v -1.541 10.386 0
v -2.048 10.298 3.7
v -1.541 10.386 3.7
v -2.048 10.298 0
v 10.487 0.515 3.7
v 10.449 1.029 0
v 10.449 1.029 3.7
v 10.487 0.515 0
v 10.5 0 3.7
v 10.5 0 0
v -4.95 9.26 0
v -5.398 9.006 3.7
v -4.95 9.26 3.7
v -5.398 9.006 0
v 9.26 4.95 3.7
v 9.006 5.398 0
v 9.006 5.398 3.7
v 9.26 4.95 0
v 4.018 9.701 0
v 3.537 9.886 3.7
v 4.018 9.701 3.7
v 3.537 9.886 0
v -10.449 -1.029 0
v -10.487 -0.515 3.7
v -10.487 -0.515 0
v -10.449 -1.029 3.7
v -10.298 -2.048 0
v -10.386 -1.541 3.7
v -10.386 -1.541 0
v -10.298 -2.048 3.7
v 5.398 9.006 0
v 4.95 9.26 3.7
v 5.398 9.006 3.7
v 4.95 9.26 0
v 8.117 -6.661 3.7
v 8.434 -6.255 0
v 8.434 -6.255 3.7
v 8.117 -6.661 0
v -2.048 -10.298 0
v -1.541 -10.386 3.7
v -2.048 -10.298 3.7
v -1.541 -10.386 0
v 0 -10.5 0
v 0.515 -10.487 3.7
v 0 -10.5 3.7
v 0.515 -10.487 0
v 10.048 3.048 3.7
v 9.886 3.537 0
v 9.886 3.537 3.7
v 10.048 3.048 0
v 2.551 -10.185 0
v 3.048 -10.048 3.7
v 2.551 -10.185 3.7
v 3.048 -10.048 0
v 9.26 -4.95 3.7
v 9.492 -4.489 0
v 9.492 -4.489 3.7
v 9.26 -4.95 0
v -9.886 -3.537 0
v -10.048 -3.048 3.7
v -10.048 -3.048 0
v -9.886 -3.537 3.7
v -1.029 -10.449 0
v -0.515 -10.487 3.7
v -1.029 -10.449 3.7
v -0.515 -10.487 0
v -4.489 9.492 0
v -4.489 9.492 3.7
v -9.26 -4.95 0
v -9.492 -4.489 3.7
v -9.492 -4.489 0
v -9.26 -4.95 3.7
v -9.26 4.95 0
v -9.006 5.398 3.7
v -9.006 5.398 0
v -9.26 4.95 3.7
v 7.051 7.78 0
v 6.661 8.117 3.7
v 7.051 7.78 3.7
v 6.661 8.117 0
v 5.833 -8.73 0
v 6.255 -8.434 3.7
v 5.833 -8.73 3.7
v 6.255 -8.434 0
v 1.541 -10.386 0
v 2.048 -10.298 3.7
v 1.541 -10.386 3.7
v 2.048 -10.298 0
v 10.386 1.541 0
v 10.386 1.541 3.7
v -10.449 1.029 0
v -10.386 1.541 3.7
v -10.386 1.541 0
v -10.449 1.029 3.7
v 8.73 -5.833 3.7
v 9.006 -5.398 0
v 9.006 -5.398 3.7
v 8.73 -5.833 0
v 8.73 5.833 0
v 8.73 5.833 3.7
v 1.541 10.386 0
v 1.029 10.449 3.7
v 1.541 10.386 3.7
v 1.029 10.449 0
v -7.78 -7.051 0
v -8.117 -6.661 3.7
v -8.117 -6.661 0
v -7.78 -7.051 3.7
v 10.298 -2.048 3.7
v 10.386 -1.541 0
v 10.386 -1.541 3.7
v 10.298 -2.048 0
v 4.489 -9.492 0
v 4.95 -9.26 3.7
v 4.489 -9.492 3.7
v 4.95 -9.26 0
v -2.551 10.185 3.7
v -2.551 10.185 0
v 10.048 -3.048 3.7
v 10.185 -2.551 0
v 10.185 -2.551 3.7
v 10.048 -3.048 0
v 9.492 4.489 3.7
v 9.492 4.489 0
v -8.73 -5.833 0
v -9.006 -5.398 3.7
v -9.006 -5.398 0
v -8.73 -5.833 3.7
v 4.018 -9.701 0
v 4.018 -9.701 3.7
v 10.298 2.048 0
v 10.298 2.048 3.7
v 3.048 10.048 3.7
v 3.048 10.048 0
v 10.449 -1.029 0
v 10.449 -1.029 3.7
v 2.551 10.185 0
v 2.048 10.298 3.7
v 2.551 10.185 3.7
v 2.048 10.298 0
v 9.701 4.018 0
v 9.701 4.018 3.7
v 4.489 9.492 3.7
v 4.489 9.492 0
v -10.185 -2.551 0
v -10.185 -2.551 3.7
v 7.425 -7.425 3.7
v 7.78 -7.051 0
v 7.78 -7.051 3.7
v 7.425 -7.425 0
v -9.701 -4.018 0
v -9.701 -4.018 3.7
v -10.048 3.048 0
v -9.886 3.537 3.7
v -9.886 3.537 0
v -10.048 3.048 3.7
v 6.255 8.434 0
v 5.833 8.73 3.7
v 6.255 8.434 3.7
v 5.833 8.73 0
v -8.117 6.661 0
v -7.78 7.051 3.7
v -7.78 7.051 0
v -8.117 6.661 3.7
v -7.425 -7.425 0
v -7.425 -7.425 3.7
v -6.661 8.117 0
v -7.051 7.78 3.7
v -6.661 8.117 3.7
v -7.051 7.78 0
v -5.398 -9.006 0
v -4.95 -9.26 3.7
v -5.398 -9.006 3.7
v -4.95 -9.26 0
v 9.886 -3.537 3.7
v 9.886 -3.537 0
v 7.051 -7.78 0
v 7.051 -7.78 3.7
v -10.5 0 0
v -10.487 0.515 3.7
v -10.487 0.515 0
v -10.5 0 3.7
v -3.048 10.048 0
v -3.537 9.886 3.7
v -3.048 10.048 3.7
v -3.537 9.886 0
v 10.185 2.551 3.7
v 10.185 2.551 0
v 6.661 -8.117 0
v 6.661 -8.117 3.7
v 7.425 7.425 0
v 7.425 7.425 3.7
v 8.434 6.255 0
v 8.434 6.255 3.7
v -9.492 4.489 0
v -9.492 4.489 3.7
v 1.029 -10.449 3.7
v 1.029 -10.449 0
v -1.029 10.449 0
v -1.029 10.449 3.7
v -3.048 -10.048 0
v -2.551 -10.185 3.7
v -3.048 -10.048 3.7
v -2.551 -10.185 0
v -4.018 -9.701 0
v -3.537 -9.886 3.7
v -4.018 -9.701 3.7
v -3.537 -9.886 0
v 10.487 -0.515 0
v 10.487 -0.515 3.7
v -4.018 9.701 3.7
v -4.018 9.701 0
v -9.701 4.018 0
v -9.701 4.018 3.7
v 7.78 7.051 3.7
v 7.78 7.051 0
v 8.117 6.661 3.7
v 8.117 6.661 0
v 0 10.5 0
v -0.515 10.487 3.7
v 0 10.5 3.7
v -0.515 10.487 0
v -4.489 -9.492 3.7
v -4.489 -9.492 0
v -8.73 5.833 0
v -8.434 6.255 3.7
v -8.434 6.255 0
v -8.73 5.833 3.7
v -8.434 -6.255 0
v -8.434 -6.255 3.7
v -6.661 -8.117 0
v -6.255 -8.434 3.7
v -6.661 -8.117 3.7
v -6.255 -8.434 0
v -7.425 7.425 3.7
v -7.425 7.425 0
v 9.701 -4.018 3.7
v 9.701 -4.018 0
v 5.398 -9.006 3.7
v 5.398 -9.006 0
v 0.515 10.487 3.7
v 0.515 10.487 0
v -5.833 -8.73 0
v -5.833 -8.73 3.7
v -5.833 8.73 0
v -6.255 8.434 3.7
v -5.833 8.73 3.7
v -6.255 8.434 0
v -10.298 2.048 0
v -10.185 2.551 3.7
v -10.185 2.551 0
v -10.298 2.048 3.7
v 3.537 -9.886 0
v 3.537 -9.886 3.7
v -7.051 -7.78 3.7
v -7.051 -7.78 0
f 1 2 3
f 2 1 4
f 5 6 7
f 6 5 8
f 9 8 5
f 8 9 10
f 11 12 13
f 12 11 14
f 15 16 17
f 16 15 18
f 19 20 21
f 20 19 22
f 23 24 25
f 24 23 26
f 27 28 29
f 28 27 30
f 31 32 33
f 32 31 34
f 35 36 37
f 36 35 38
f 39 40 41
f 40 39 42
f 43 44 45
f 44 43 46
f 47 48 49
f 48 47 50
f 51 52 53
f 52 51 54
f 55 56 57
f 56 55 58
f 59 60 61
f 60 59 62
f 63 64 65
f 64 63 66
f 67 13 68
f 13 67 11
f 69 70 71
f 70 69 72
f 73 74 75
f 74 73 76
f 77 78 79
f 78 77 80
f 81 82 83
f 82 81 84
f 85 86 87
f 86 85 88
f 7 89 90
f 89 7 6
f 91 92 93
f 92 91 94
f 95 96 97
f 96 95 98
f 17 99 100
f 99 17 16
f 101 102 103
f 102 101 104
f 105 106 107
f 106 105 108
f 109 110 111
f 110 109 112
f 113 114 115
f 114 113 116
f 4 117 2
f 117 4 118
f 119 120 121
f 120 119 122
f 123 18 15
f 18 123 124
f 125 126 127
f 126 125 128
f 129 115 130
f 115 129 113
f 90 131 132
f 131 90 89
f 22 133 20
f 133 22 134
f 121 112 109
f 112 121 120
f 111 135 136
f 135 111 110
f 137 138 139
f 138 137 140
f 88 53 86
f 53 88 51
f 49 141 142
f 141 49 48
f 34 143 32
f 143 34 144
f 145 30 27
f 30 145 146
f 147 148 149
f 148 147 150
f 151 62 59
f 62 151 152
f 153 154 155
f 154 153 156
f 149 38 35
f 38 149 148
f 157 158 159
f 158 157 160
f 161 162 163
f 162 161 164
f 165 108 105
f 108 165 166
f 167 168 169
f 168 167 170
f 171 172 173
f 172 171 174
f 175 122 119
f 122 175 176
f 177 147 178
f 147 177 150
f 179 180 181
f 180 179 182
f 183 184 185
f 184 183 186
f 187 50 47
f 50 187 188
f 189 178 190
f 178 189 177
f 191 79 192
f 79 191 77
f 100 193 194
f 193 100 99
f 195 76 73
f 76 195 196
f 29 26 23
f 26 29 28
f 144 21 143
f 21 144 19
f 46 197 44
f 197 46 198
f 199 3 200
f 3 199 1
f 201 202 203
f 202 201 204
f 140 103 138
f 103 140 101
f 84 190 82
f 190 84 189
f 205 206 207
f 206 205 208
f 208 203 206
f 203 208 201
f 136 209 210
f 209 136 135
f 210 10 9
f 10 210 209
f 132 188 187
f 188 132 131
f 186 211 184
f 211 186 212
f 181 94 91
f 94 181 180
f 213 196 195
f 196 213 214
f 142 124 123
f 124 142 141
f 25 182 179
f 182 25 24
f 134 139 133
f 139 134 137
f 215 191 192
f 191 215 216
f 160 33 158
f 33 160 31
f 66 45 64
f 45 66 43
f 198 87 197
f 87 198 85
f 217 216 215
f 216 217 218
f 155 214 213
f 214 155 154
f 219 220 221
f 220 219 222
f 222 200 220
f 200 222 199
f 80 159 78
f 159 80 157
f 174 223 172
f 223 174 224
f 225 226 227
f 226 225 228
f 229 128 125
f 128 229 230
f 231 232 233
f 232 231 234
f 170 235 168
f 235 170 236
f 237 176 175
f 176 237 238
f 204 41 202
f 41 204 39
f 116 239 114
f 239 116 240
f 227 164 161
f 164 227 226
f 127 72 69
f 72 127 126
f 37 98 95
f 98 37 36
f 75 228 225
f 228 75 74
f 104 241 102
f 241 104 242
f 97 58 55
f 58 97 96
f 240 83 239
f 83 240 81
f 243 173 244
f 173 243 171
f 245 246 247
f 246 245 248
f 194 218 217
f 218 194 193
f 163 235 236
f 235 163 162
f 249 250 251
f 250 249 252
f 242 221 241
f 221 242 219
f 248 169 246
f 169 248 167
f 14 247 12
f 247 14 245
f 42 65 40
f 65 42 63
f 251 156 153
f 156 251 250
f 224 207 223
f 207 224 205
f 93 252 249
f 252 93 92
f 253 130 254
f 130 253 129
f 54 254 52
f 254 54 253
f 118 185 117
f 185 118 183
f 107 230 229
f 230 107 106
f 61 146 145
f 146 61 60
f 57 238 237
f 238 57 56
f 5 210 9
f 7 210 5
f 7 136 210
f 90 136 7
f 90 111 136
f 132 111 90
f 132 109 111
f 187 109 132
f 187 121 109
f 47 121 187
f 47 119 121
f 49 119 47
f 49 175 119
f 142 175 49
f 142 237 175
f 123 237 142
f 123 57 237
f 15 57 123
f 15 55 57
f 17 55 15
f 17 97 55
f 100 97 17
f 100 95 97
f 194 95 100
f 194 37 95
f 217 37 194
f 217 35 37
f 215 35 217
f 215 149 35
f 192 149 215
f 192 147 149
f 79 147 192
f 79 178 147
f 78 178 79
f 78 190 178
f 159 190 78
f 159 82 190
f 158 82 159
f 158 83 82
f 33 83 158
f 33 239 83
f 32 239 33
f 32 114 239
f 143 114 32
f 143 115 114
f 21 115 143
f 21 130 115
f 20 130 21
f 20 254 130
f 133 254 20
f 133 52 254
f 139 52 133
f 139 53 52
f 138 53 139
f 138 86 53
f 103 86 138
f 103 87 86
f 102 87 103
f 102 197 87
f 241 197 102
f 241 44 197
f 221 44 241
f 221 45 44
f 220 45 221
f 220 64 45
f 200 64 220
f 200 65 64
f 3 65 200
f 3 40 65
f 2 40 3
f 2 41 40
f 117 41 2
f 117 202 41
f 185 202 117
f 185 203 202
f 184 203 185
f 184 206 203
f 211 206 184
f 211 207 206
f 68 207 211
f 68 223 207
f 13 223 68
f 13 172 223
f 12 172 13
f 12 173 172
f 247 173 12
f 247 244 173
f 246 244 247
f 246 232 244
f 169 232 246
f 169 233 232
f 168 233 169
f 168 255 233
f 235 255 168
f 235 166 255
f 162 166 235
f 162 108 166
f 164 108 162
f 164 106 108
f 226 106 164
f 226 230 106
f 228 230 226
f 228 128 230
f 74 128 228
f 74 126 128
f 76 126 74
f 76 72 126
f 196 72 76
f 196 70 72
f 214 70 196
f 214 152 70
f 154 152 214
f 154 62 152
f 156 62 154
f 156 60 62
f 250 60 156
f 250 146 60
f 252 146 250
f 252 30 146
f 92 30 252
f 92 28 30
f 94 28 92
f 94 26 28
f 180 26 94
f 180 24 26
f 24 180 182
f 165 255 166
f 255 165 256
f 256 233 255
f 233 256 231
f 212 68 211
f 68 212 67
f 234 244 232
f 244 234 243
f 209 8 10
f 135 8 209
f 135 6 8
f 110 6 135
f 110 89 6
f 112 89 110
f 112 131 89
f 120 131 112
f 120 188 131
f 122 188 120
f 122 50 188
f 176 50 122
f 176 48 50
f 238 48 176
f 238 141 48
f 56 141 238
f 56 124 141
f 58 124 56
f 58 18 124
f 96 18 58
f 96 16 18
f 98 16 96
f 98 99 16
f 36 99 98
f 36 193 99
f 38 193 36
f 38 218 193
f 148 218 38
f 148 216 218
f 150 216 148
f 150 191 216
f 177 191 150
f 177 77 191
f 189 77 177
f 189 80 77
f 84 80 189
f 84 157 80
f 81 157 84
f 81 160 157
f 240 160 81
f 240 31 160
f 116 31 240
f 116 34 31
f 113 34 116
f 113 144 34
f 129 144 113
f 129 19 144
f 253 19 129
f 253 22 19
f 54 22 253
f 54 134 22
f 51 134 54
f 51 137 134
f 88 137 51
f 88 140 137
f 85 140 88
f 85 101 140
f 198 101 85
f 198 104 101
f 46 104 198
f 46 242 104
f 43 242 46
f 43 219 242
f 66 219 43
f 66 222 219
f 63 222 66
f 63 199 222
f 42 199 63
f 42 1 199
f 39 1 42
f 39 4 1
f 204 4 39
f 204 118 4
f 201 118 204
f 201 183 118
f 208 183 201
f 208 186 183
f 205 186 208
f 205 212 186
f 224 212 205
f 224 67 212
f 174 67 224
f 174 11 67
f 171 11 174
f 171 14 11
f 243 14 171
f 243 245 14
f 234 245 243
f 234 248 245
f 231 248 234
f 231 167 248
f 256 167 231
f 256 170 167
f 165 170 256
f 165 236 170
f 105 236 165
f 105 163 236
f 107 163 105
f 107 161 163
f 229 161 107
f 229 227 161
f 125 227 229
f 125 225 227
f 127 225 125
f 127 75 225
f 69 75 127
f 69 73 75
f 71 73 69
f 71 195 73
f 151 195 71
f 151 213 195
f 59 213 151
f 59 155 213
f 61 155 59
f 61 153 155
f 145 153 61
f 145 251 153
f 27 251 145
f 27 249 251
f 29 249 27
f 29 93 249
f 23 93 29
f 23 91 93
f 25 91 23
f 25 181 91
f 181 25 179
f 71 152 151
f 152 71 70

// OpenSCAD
$fn = 128;

r = 10.5;
h = 3.7;
t = 13.5;

difference() {
  cylinder(h = h, r = r);
  translate([0, 0, -0.01])
    cylinder(h = h + 0.02, r = max(0, r - t));
}
